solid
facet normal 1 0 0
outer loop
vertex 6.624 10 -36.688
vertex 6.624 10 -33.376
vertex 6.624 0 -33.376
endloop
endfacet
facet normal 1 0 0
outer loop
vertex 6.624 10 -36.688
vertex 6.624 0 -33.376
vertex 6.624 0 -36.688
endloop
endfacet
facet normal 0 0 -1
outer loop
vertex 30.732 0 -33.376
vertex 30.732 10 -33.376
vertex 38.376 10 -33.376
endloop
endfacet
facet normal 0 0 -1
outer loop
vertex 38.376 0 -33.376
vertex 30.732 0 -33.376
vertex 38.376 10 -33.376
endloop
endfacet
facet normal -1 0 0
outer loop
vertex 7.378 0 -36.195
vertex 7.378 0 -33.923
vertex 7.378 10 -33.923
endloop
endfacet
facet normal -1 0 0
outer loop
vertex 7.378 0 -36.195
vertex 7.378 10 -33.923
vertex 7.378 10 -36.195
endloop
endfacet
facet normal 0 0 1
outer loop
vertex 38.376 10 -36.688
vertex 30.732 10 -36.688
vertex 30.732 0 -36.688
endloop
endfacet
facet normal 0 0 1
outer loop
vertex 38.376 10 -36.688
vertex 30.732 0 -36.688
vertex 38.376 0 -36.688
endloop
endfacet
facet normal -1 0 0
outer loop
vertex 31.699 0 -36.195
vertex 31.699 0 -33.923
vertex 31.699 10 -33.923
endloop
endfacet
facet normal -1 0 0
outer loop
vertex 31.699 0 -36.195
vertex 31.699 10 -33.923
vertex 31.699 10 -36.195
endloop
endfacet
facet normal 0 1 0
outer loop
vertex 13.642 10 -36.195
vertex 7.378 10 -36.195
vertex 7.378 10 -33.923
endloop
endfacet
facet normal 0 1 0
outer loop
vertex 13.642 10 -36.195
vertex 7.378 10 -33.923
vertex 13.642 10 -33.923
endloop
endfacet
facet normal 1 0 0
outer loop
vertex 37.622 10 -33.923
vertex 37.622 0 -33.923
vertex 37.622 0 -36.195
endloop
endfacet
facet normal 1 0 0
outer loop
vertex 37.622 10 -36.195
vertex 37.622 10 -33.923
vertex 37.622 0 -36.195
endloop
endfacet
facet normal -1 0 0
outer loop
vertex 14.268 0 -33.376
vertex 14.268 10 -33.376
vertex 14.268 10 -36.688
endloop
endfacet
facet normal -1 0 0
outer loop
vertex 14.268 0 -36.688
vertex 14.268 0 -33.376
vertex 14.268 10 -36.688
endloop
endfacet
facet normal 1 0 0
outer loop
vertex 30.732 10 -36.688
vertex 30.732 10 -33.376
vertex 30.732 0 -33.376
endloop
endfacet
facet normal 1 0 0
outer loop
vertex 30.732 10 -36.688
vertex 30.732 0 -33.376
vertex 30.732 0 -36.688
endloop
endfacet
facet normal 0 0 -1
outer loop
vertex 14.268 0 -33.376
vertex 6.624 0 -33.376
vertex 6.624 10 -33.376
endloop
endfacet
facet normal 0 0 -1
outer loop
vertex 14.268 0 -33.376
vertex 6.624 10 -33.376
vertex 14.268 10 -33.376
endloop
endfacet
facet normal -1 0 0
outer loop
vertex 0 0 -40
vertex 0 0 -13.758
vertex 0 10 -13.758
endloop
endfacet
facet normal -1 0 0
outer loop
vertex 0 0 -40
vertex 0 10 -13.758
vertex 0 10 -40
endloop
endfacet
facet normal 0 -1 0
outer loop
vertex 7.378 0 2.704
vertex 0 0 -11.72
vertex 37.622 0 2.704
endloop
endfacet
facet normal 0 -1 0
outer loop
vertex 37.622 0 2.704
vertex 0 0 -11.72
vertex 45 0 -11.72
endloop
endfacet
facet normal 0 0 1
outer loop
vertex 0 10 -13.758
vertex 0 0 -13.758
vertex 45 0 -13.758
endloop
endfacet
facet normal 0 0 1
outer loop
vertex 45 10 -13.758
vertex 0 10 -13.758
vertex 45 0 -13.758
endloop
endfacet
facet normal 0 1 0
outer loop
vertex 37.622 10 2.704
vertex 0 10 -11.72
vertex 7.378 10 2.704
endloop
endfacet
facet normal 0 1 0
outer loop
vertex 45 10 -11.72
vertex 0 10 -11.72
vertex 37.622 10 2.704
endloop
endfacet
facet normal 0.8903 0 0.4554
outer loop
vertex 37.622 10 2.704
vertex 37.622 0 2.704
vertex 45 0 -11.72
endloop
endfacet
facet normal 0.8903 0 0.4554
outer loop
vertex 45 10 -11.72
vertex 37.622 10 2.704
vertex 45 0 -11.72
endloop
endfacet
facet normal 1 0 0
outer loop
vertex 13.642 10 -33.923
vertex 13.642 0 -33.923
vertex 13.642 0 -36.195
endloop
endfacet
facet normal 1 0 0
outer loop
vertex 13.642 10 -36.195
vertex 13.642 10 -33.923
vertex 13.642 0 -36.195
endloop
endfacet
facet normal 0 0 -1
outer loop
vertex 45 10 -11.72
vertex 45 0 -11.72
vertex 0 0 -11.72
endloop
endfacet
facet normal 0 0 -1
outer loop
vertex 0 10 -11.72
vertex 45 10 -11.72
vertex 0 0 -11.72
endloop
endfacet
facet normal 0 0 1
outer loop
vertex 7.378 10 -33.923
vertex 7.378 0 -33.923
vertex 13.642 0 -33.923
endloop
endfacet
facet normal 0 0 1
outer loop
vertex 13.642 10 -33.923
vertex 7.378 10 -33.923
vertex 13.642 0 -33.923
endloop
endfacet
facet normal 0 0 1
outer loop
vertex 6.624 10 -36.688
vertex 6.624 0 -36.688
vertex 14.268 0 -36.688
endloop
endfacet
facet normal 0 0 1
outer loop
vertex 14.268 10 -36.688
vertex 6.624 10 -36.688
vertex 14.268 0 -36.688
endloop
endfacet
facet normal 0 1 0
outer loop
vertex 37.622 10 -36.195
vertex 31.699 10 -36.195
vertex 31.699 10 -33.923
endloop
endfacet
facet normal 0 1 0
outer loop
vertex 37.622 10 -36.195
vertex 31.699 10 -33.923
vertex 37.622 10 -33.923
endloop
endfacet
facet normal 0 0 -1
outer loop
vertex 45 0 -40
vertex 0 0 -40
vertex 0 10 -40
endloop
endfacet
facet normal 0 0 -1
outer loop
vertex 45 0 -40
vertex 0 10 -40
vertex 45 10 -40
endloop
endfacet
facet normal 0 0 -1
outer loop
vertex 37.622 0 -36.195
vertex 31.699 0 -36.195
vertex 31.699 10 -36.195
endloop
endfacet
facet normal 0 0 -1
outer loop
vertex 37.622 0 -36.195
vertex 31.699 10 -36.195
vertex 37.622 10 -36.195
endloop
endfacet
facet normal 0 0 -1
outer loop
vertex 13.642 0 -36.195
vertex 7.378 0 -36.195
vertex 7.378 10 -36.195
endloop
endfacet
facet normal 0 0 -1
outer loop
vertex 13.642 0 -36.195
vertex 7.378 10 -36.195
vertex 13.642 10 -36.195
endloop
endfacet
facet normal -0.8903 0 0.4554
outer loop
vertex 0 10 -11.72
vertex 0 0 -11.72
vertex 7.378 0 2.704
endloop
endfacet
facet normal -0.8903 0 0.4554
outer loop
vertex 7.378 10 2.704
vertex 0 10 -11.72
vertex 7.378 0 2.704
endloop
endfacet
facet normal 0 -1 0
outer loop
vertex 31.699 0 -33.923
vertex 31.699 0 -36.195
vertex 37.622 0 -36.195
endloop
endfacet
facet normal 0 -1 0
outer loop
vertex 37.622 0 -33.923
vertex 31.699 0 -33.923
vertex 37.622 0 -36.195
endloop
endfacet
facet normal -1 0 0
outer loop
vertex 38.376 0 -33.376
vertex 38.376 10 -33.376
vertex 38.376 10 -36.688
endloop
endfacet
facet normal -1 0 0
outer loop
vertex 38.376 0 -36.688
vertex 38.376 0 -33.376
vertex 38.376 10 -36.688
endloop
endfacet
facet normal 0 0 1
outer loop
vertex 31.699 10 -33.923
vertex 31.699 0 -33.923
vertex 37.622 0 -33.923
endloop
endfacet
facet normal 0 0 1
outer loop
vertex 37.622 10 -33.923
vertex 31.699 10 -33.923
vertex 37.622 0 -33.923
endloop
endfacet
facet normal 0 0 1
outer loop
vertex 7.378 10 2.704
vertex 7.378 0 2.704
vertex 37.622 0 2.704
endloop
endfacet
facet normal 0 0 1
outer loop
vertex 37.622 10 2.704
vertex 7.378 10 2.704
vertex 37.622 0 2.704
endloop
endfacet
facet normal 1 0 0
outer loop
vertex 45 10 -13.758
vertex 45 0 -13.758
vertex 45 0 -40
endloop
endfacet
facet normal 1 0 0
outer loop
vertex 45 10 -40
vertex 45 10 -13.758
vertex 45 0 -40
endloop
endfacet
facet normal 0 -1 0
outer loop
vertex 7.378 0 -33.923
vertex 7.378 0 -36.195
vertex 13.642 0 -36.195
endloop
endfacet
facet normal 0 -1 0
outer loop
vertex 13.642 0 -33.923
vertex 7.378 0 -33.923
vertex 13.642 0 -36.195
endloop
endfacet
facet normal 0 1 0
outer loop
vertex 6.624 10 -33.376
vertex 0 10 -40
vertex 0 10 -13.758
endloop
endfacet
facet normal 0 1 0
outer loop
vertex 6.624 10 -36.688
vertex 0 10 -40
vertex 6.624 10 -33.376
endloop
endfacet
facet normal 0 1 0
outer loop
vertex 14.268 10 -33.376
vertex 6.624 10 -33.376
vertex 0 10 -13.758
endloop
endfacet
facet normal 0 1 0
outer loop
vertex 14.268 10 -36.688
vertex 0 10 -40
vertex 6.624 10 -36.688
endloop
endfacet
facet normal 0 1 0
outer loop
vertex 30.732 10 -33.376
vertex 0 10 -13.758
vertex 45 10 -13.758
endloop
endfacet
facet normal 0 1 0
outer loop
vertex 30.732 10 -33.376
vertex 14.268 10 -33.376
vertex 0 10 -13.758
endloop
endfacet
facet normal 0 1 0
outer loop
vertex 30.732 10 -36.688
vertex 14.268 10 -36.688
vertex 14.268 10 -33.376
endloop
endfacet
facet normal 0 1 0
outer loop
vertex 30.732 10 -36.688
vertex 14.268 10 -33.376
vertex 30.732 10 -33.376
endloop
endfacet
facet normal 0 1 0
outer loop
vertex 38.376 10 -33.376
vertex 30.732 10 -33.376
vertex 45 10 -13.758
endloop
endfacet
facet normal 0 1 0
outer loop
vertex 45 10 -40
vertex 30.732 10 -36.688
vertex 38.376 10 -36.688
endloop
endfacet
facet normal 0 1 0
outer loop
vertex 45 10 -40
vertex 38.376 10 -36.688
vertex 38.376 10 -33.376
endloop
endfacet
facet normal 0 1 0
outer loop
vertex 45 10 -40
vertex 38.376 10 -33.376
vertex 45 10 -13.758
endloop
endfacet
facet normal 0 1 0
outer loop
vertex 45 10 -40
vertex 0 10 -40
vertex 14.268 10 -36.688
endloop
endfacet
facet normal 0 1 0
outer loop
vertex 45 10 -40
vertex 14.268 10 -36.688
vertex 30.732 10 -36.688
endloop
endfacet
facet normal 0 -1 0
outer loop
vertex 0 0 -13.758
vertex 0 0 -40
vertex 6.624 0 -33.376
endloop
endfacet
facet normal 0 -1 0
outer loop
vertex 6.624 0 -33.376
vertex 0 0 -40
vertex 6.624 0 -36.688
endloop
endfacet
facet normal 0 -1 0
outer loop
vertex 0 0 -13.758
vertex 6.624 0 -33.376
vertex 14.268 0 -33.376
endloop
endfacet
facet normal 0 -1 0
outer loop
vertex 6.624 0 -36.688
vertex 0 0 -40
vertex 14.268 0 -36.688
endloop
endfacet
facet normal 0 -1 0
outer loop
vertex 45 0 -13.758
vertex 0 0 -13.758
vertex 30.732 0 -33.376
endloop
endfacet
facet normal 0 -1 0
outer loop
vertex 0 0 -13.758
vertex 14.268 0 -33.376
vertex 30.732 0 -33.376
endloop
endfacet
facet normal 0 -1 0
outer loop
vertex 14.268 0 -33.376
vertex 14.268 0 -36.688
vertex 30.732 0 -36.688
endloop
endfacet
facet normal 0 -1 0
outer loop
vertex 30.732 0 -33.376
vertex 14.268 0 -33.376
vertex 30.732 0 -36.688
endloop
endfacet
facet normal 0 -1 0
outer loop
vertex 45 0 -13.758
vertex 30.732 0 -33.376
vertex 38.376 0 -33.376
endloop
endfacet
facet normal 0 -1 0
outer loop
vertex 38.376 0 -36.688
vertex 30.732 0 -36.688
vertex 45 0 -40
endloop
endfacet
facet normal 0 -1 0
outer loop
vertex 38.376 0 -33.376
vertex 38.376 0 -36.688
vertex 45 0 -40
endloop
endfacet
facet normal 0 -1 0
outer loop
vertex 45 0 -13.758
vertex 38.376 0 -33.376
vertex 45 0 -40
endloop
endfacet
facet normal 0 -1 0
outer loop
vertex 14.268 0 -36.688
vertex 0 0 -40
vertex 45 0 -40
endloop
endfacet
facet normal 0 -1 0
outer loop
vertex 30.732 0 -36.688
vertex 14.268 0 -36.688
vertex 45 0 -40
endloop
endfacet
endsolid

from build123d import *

# Parameters (mm, degrees)
BOSS_EXTRUDE3_DEPTH   = 10
SKETCH1_W             = 45
SKETCH1_H             = 26.242038217
SKETCH1_W_2           = 7.643312102
SKETCH1_H_2           = 3.312101911
BOSS_EXTRUDE3_2_DEPTH = 10
SKETCH1_W_3           = 6.263973538
SKETCH1_H_3           = 2.271386604
BOSS_EXTRUDE3_3_DEPTH = 10
SKETCH1_W_4           = 5.923265548
BOSS_EXTRUDE3_4_DEPTH = 10


with BuildPart() as part:
    # Sketch1 → Boss-Extrude3 (new body)
    with BuildSketch(Plane(origin=(0, 0, 0), x_dir=(1, 0, 0), z_dir=(0, 1, 0))):
        Polygon((7.377618706, -2.703877559), (22.5, -2.703877559), (37.622381294, -2.703877559), (45, 11.719745223), (0, 11.719745223), align=None)
    extrude(amount=BOSS_EXTRUDE3_DEPTH)


with BuildPart() as body_2:
    # Sketch1 → Boss-Extrude3 2 (new body)
    with BuildSketch(Plane(origin=(0, 0, 0), x_dir=(1, 0, 0), z_dir=(0, 1, 0))):
        with Locations((22.5, 26.878980891)):
            Rectangle(SKETCH1_W, SKETCH1_H)
        with Locations((34.554140127, 35.031847134)):
            Rectangle(SKETCH1_W_2, SKETCH1_H_2, mode=Mode.SUBTRACT)
        with Locations((10.445859873, 35.031847134)):
            Rectangle(SKETCH1_W_2, SKETCH1_H_2, mode=Mode.SUBTRACT)
    extrude(amount=BOSS_EXTRUDE3_2_DEPTH)


with BuildPart() as body_3:
    # Sketch1 → Boss-Extrude3 3 (new body)
    with BuildSketch(Plane(origin=(0, 0, 0), x_dir=(1, 0, 0), z_dir=(0, 1, 0))):
        with Locations((10.509605475, 35.058829435)):
            Rectangle(SKETCH1_W_3, SKETCH1_H_3)
    extrude(amount=BOSS_EXTRUDE3_3_DEPTH)


with BuildPart() as body_4:
    # Sketch1 → Boss-Extrude3 4 (new body)
    with BuildSketch(Plane(origin=(0, 0, 0), x_dir=(1, 0, 0), z_dir=(0, 1, 0))):
        with Locations((34.66074852, 35.058829435)):
            Rectangle(SKETCH1_W_4, SKETCH1_H_3)
    extrude(amount=BOSS_EXTRUDE3_4_DEPTH)


solid = Compound([part.part, body_2.part, body_3.part, body_4.part])
